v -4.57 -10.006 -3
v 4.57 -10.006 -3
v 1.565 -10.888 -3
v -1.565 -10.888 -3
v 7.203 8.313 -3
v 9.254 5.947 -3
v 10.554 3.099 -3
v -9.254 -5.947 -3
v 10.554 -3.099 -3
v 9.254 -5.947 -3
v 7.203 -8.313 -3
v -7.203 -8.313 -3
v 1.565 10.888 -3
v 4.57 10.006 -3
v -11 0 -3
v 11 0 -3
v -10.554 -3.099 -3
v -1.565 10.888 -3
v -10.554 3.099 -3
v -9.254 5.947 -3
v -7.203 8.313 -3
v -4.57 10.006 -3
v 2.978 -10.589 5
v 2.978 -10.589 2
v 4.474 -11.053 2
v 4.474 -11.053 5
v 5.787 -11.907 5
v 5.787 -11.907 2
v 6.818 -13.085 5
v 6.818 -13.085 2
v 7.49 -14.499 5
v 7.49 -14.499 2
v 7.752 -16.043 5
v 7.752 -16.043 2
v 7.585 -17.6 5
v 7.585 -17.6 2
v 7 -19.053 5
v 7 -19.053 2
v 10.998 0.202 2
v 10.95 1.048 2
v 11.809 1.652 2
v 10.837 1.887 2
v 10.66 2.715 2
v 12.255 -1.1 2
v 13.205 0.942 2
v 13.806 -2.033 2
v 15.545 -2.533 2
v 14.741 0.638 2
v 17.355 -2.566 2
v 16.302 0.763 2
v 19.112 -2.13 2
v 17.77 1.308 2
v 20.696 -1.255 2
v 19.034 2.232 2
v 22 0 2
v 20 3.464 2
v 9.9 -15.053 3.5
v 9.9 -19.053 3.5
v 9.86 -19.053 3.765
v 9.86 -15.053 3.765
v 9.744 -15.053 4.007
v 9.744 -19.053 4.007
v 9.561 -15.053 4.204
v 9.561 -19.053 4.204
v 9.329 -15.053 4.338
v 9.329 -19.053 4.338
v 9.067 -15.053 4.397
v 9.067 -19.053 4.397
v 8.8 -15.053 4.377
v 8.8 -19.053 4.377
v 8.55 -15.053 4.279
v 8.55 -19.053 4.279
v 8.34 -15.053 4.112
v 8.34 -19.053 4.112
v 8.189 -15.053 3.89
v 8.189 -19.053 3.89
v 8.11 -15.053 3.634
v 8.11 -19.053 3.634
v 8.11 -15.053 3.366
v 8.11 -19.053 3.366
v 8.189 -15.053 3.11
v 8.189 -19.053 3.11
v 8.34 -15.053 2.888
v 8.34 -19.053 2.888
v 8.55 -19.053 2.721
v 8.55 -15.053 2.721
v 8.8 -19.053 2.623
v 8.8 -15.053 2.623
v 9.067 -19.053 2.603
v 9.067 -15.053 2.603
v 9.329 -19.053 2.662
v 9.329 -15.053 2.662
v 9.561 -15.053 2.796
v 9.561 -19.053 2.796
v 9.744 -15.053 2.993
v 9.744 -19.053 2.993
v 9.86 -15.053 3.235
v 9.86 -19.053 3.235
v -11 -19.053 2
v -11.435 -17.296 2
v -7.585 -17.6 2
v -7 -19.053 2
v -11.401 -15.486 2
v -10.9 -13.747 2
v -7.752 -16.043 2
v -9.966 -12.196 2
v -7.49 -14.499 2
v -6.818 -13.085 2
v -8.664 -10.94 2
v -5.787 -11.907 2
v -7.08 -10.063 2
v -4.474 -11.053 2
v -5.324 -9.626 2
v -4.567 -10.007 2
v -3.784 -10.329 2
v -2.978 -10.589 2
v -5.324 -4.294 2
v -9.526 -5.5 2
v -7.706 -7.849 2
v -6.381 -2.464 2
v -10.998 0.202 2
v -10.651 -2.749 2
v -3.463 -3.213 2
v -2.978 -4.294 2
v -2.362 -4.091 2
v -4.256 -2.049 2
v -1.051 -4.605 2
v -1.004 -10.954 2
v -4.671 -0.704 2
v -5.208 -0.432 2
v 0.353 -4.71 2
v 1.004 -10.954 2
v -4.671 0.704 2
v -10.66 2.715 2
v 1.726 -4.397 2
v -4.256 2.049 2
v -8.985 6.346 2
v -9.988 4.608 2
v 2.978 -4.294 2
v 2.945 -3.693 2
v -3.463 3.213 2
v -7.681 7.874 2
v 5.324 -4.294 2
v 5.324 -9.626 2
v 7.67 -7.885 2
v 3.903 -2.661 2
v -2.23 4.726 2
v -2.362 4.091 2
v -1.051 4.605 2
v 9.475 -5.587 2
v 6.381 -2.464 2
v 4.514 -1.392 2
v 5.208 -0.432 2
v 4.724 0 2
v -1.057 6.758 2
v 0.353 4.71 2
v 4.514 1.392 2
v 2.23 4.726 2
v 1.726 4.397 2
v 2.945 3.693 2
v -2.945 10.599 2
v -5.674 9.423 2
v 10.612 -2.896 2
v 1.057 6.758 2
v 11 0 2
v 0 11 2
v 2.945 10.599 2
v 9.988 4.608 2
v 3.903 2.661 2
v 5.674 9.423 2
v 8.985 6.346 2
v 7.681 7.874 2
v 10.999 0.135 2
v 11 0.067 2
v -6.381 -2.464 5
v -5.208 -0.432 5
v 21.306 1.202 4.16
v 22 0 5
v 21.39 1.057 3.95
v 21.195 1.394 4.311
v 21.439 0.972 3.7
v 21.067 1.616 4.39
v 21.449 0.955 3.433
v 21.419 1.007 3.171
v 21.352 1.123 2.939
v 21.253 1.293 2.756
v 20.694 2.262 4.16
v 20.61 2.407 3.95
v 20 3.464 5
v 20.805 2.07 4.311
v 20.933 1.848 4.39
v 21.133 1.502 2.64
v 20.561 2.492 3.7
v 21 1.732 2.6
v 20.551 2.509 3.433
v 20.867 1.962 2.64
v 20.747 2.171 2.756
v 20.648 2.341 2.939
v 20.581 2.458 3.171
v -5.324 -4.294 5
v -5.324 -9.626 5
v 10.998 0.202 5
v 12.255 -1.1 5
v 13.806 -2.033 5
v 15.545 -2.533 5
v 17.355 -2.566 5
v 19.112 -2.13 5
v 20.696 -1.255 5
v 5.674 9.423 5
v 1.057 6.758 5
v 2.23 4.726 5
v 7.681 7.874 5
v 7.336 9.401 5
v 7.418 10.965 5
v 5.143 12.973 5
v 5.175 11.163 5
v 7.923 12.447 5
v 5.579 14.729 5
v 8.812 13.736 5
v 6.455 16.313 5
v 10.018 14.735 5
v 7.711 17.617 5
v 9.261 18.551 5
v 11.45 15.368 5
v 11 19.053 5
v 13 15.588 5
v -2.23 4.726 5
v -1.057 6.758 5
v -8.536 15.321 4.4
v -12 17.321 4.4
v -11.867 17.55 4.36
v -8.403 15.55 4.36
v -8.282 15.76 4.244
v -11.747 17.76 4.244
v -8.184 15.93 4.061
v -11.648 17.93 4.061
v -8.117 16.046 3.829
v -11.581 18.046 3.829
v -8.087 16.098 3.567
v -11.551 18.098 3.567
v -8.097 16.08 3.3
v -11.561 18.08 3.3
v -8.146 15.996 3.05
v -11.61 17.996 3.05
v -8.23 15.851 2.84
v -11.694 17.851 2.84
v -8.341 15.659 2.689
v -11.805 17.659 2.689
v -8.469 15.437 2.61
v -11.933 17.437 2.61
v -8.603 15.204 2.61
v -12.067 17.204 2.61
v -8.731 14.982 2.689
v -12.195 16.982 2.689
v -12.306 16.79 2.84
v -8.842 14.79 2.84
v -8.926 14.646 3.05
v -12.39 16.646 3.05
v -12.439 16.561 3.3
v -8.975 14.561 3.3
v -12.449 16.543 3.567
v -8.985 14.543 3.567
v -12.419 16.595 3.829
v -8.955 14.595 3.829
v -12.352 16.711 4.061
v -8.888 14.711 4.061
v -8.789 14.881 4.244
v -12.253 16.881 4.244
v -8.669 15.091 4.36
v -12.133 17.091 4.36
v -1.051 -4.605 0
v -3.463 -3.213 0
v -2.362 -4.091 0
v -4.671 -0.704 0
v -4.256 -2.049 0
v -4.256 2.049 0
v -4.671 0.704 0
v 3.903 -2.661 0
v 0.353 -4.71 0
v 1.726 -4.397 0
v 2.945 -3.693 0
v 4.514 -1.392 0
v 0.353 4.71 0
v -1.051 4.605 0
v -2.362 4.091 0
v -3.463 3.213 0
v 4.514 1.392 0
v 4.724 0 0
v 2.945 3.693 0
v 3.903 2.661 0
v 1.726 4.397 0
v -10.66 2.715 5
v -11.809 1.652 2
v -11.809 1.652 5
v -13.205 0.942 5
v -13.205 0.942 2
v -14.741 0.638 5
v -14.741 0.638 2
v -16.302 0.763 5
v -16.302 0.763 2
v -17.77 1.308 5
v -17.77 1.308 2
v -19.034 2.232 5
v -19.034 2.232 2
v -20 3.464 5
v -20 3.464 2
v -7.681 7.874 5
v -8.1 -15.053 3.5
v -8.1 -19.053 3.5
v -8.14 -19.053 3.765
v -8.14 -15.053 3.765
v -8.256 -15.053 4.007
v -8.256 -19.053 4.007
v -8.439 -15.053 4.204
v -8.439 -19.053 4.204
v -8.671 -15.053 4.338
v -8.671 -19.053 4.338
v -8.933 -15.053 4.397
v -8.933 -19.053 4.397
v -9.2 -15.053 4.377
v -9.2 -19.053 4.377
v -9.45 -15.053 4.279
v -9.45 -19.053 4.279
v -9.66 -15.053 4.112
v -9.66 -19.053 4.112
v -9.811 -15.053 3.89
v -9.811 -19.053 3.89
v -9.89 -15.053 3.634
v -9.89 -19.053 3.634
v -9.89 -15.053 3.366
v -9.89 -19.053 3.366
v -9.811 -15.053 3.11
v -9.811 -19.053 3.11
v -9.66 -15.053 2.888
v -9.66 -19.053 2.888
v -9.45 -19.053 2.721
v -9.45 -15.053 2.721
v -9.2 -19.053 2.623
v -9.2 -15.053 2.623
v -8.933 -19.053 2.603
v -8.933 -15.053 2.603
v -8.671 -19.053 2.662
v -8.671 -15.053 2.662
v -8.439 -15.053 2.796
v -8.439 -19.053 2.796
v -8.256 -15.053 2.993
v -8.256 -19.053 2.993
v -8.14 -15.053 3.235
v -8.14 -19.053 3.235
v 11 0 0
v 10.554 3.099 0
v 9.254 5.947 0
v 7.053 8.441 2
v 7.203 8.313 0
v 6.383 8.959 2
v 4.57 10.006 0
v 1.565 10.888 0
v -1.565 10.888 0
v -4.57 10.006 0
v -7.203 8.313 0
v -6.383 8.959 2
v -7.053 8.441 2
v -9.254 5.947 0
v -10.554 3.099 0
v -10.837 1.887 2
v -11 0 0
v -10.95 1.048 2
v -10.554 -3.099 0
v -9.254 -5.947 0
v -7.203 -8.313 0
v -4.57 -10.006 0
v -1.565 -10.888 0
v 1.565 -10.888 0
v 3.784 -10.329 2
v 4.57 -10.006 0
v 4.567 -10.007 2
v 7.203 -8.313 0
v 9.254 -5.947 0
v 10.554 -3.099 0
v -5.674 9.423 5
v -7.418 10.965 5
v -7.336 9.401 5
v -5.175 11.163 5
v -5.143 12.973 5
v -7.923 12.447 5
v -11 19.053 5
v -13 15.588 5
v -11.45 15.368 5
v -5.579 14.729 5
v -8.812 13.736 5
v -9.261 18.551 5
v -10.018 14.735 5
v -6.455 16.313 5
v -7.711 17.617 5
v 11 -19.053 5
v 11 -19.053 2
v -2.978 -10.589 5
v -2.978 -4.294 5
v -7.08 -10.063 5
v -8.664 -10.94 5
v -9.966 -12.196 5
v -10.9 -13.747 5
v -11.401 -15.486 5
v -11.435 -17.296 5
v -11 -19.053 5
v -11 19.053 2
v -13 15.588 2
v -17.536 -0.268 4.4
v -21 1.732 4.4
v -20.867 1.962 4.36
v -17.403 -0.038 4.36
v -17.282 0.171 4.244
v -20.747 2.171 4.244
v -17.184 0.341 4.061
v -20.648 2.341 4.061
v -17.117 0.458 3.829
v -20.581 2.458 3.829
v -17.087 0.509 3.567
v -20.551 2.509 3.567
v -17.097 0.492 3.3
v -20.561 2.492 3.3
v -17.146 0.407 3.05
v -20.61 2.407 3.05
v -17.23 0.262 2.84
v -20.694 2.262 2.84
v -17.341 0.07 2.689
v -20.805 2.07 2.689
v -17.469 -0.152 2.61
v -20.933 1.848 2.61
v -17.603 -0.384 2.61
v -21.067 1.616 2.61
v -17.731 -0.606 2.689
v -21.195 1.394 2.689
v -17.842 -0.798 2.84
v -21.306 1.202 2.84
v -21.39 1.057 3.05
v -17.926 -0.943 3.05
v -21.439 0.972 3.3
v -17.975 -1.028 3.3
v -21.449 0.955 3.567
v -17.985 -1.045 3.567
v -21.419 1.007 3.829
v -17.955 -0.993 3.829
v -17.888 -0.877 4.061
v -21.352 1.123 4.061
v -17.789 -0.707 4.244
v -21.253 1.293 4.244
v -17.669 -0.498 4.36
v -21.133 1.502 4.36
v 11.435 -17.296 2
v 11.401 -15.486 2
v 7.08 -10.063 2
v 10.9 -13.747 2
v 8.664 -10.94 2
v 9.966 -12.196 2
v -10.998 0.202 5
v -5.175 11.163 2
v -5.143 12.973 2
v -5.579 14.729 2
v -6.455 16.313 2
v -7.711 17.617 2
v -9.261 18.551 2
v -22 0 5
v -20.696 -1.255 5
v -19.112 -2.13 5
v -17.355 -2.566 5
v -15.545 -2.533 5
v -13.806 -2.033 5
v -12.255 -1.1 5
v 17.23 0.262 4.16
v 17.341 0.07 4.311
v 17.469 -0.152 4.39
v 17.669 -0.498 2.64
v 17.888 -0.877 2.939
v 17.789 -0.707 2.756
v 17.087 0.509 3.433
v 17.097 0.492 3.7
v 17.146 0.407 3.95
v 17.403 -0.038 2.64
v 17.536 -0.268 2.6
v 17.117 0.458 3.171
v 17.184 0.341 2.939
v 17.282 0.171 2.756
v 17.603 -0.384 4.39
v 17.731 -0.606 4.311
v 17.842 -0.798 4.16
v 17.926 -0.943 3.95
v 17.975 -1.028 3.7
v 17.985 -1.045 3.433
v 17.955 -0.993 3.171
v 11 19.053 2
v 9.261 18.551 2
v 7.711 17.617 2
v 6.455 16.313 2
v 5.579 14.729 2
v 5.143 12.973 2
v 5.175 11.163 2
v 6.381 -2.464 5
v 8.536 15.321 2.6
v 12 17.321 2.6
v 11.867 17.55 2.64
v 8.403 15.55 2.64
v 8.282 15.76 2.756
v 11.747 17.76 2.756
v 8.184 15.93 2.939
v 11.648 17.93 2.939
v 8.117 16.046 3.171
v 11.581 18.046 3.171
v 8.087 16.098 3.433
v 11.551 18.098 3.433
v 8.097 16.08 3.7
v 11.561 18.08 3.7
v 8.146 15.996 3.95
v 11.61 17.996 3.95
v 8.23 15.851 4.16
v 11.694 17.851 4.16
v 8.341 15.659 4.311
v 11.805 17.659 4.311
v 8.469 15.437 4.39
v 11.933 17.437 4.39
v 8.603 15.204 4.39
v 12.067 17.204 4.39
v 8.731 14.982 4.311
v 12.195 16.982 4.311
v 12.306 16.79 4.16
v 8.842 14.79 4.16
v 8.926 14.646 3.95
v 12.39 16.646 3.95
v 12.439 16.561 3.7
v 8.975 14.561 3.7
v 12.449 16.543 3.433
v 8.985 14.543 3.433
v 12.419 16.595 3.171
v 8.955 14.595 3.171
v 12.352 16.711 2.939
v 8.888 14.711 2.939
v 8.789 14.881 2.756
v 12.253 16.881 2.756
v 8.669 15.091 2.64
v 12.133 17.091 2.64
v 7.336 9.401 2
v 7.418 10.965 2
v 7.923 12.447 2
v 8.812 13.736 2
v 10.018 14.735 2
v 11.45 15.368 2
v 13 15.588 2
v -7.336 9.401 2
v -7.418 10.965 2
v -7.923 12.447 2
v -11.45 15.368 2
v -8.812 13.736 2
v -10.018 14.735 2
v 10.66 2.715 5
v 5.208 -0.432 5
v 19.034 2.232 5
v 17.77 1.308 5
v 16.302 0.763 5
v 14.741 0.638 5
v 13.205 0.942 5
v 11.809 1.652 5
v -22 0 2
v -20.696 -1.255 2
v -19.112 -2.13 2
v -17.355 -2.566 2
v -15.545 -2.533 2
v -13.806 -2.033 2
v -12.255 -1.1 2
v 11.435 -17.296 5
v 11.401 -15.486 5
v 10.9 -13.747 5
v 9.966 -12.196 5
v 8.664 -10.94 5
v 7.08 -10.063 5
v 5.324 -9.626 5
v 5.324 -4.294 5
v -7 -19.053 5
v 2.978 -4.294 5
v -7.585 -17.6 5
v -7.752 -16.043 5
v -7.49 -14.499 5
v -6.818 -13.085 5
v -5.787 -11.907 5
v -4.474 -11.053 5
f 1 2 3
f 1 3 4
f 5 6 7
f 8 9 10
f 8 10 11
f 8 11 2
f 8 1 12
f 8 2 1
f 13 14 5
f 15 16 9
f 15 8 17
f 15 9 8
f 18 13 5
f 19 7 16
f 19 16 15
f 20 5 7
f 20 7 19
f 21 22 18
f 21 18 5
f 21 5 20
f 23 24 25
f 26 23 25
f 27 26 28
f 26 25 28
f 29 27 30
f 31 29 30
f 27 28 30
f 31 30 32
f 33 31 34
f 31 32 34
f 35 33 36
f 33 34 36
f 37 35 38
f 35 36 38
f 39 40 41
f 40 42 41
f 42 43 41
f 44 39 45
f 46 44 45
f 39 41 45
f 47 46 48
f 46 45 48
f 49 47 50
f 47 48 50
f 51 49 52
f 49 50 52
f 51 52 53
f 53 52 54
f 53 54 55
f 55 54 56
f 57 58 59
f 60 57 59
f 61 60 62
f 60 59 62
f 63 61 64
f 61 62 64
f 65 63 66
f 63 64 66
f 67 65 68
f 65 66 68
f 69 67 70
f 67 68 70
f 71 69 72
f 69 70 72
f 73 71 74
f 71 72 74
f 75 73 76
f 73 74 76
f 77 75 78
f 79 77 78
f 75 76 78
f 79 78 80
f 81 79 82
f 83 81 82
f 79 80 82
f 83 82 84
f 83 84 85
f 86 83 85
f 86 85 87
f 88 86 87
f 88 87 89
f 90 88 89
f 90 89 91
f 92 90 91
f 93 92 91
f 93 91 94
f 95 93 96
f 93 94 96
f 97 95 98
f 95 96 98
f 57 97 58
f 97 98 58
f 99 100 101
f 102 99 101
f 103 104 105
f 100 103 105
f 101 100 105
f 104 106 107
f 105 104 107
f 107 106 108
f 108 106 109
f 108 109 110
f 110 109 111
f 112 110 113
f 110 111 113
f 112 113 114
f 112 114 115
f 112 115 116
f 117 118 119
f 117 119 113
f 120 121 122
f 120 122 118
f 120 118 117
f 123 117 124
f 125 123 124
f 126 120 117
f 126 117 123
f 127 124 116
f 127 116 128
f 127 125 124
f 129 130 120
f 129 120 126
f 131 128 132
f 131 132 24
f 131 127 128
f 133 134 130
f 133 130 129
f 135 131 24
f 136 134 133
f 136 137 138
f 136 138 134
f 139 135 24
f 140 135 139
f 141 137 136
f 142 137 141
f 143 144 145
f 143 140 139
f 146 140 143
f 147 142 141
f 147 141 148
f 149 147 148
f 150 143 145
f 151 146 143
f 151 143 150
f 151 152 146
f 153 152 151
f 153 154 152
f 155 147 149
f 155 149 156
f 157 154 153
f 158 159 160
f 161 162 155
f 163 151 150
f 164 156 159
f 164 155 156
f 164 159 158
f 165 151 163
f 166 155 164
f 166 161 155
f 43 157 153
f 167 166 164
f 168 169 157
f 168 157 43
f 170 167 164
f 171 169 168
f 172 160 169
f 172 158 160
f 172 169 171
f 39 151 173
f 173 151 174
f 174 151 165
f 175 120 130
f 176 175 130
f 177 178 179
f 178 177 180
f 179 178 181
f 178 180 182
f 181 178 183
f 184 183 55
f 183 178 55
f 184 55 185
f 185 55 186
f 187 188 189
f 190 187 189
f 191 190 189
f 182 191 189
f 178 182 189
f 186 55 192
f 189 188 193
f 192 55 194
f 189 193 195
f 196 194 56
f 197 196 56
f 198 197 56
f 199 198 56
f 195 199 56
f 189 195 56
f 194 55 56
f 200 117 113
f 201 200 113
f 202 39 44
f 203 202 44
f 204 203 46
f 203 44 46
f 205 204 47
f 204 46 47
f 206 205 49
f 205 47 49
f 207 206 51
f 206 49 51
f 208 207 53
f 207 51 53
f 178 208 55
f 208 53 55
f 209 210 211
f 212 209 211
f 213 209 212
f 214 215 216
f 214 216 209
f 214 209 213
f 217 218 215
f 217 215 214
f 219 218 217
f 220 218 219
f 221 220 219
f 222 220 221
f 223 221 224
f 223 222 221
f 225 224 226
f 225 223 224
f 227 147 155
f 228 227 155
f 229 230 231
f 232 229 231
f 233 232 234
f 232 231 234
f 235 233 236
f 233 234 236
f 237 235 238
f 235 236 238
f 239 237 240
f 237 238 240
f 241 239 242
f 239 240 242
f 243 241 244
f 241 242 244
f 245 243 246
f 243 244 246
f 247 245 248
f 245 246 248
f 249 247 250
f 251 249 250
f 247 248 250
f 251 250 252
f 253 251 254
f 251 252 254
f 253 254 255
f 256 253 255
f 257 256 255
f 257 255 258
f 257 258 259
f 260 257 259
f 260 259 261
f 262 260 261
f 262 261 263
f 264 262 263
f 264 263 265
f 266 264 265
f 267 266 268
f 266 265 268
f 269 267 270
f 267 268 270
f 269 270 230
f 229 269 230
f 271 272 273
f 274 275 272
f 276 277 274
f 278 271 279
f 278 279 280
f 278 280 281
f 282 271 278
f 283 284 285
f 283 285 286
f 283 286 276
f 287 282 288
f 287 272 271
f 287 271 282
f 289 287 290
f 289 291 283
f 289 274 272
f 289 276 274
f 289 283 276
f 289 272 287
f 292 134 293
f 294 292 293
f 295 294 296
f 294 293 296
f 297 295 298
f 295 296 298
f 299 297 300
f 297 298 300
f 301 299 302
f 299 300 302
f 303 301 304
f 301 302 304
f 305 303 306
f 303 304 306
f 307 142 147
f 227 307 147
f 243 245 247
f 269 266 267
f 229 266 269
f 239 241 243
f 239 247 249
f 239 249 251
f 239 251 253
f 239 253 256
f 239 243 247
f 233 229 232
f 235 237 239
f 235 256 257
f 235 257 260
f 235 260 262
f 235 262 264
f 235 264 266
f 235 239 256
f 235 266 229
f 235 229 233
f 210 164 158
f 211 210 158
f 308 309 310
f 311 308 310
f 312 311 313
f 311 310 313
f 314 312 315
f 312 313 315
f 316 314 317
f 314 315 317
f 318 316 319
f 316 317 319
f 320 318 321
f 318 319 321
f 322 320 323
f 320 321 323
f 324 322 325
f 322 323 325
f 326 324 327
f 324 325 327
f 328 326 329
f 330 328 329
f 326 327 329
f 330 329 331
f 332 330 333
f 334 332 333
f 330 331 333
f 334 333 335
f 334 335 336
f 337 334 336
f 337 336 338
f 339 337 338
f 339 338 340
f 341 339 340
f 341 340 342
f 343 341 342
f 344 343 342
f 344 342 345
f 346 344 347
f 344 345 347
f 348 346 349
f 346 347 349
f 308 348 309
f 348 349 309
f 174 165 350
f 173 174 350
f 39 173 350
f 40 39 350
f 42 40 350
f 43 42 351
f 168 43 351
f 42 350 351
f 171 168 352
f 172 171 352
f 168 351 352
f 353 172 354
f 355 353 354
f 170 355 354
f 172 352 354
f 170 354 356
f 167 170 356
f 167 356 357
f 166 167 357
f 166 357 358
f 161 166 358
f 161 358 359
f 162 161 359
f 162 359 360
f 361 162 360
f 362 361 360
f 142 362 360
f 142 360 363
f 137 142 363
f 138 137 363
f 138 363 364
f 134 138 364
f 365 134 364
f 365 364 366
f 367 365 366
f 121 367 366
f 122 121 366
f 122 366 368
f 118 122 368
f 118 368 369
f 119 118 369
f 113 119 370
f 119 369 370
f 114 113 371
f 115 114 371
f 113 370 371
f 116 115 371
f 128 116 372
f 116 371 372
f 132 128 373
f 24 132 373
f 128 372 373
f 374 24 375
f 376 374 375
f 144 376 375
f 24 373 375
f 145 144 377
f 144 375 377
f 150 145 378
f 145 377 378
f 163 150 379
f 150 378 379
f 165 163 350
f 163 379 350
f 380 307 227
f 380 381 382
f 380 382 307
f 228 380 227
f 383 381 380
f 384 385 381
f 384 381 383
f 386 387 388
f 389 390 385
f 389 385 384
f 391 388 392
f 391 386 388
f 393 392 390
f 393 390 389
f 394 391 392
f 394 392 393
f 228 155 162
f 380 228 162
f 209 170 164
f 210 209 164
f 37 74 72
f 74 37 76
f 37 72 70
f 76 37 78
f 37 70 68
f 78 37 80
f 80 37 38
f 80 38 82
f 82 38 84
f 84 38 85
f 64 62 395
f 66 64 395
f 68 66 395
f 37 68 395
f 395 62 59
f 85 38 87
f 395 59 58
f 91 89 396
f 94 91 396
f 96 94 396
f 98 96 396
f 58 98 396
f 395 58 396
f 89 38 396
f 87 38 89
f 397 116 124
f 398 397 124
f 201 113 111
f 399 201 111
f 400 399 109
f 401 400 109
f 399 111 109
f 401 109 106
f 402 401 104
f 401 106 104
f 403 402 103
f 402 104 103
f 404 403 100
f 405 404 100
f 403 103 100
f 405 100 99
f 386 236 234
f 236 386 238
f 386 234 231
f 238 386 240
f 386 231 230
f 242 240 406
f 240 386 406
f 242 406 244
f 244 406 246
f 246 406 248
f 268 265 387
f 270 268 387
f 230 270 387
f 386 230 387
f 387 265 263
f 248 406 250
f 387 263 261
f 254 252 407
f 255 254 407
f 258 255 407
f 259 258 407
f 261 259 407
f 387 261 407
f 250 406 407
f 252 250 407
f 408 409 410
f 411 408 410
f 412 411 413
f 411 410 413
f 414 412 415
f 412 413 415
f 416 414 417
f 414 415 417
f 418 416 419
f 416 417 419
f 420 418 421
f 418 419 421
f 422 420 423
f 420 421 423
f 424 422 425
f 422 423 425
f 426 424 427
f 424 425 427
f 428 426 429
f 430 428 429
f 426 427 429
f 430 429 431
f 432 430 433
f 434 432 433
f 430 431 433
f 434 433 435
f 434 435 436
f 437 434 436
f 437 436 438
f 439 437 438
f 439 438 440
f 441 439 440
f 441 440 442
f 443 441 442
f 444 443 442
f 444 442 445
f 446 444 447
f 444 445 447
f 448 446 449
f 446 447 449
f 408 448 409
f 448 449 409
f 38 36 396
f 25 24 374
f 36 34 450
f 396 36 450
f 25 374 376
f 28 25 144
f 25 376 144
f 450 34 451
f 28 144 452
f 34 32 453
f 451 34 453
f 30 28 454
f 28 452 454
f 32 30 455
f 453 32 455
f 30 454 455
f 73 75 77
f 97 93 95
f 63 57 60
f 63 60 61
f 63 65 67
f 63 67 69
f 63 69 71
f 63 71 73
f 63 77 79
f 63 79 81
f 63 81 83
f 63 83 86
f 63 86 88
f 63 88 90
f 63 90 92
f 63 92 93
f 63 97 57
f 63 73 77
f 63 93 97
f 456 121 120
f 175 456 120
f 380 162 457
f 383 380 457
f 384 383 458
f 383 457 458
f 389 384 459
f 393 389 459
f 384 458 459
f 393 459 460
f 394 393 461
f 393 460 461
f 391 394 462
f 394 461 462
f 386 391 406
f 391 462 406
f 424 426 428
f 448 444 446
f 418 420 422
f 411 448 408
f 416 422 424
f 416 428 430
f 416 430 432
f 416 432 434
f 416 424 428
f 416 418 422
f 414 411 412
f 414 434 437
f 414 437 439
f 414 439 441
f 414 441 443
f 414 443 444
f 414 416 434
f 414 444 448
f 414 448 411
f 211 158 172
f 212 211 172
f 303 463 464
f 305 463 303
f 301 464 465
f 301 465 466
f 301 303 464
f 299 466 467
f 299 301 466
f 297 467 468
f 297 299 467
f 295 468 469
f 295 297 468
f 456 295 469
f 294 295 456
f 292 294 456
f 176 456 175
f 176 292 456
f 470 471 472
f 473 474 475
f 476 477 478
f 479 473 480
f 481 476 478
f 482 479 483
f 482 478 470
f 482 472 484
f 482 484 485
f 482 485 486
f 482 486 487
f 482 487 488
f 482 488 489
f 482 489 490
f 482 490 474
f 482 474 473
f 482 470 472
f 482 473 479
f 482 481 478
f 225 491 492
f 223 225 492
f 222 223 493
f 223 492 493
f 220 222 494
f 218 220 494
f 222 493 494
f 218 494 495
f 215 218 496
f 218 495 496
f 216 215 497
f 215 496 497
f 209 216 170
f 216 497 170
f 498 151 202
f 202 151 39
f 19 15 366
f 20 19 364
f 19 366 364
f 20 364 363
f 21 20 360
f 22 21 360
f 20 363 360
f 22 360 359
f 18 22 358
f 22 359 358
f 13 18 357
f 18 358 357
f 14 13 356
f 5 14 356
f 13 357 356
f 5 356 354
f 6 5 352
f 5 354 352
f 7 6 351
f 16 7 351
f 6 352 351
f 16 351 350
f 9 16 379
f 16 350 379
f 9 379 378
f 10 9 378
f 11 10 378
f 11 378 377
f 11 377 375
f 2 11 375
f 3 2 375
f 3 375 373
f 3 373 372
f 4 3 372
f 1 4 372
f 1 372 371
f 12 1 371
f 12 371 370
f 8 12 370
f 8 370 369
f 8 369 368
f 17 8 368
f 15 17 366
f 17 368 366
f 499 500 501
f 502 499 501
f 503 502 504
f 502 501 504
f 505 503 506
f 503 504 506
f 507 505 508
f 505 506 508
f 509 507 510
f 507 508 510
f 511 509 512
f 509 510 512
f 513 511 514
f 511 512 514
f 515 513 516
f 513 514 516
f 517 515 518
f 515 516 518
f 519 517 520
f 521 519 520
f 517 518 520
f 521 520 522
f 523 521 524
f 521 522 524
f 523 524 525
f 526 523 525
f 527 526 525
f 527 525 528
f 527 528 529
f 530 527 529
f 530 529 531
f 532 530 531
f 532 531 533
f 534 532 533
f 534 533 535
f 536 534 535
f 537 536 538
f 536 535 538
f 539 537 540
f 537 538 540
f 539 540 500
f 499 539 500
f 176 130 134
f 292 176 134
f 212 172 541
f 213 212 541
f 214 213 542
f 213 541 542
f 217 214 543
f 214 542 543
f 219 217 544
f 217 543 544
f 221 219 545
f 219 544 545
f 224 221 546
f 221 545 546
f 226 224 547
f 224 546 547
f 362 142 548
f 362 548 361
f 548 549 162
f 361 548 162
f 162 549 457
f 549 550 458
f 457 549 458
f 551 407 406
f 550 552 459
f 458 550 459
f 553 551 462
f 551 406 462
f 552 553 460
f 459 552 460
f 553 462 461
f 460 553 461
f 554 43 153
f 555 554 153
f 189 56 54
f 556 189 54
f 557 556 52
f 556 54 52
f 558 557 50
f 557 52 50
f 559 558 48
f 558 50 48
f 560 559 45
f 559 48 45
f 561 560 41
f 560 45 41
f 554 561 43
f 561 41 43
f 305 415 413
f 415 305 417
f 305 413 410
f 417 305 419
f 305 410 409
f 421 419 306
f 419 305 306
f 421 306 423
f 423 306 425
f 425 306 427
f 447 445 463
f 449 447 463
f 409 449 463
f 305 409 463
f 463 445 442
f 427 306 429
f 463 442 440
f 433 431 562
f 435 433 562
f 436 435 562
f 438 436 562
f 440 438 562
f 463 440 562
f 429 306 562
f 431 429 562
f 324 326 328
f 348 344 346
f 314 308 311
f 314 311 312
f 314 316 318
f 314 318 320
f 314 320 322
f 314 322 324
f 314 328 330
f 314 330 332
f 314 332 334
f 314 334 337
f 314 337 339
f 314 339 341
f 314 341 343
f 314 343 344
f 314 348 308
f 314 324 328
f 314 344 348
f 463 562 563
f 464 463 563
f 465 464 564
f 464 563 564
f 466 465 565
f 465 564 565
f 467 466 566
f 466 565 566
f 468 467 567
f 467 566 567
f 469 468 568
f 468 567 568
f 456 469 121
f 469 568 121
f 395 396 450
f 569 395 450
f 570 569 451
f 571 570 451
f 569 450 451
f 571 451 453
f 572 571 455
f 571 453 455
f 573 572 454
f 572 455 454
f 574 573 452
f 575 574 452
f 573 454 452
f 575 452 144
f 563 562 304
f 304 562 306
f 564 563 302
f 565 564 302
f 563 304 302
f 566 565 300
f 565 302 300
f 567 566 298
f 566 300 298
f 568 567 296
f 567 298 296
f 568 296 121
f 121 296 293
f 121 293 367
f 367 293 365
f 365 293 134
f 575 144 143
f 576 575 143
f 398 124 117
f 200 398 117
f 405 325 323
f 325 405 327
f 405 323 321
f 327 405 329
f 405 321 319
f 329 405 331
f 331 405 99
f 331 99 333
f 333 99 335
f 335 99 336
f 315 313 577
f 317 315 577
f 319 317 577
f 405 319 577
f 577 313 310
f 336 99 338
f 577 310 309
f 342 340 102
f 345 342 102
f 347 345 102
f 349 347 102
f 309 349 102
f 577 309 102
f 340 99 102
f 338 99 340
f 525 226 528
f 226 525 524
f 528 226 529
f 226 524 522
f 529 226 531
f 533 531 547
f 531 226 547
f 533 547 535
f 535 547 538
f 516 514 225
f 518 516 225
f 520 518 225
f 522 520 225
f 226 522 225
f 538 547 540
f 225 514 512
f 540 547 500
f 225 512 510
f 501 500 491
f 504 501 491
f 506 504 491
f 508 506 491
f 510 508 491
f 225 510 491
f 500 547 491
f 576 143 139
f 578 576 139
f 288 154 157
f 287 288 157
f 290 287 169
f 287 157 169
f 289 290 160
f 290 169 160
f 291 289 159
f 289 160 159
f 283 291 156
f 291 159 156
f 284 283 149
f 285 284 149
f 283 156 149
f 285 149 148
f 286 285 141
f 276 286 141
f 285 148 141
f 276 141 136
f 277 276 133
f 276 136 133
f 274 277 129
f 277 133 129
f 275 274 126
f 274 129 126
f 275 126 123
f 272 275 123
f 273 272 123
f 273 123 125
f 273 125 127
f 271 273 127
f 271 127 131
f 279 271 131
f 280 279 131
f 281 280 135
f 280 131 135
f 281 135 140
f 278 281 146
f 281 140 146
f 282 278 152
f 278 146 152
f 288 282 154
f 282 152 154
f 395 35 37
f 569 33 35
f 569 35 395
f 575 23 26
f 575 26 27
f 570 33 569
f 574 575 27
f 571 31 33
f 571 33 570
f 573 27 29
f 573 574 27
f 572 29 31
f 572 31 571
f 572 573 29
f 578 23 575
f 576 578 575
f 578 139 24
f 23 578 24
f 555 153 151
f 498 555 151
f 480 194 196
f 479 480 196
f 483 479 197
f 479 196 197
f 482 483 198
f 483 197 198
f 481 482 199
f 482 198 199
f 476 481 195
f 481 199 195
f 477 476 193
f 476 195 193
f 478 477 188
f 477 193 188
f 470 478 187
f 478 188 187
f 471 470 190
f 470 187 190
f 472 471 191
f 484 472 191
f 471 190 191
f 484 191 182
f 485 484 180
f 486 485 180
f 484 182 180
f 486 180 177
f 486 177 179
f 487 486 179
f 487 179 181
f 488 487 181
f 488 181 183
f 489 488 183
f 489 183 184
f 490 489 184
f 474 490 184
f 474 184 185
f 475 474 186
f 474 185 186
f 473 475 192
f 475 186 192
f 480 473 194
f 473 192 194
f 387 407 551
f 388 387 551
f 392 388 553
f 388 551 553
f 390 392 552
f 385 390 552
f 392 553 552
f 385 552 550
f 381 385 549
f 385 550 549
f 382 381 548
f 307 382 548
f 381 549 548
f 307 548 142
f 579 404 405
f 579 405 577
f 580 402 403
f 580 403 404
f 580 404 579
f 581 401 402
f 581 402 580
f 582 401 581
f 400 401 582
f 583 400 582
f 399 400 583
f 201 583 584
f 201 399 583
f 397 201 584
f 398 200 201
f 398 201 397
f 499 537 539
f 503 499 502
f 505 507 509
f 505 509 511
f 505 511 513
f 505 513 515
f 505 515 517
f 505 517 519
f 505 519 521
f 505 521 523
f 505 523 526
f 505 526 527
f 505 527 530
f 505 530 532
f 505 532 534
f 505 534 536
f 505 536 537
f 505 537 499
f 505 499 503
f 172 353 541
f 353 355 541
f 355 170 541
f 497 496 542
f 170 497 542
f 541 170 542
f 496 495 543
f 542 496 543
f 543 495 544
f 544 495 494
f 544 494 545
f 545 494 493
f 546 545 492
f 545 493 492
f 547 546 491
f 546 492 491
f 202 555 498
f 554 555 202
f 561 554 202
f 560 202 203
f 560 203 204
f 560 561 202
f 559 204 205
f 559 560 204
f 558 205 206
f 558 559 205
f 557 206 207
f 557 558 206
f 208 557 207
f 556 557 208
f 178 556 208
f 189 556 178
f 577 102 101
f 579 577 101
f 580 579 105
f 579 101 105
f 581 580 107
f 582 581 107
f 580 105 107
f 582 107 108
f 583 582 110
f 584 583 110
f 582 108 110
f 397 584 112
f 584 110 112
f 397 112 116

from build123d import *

# Parameters (mm, degrees)
SKETCH_1_R          = 11
EXTRUDE_1_DEPTH     = 2
EXTRUDE_2_DEPTH     = 3
SKETCH_4_R          = 0.9
CUT_EXTRUDE_1_DEPTH = 4
SKETCH_5_R          = 0.9
CUT_EXTRUDE_2_DEPTH = 4
SKETCH_6_R          = 0.9
CUT_EXTRUDE_3_DEPTH = 4
SKETCH_8_R          = 11
EXTRUDE_3_DEPTH     = 3
SKETCH_9_R          = 4.723532035
CUT_EXTRUDE_4_DEPTH = 2


with BuildPart() as part:
    # 草图1 → 凸台-拉伸1 (new body)
    with BuildSketch(Plane.XY):
        Circle(SKETCH_1_R)
    extrude(amount=EXTRUDE_1_DEPTH)

    # 草图2 → 凸台-拉伸2 (add)
    with BuildSketch(Plane.XY.offset(2)):
        with BuildLine():
            ThreePointArc((-5.674338907, 9.423474835), (-6.722663515, 8.706652357), (-7.681381188, 7.873778194))
            Line((-7.681381188, 7.873778194), (-2.2295398, 4.726156102))
            Line((-2.2295398, 4.726156102), (-1.056740901, 6.757503383))
            Line((-1.056740901, 6.757503383), (-5.674338907, 9.423474835))
        make_face()
        with BuildLine():
            Line((-11, 19.052558883), (-13, 15.588457268))
            ThreePointArc((-13, 15.588457268), (-8.322973179, 13.122163256), (-7.681381188, 7.873778194))
            ThreePointArc((-7.681381188, 7.873778194), (-6.722663515, 8.706652357), (-5.674338907, 9.423474835))
            ThreePointArc((-5.674338907, 9.423474835), (-5.965261919, 15.549873274), (-11, 19.052558883))
        make_face()
        with BuildLine():
            Line((-20, 3.464101615), (-22, 0))
            ThreePointArc((-22, 0), (-16.44921624, -2.608868275), (-10.998138053, 0.202384226))
            ThreePointArc((-10.998138053, 0.202384226), (-10.901513881, 1.468671206), (-10.659582534, 2.715382148))
            ThreePointArc((-10.659582534, 2.715382148), (-15.525613322, 0.64682458), (-20, 3.464101615))
        make_face()
        with BuildLine():
            ThreePointArc((-10.659582534, 2.715382148), (-10.901513881, 1.468671206), (-10.998138053, 0.202384226))
            Line((-10.998138053, 0.202384226), (-6.380540046, -2.463587226))
            Line((-6.380540046, -2.463587226), (-5.207741146, -0.432239945))
            Line((-5.207741146, -0.432239945), (-10.659582534, 2.715382148))
        make_face()
        with BuildLine():
            ThreePointArc((-5.323799145, -9.625859061), (-10.483954321, -12.941004999), (-11, -19.052558883))
            Line((-11, -19.052558883), (-7, -19.052558883))
            ThreePointArc((-7, -19.052558883), (-7.202640143, -13.768987836), (-2.978201346, -10.589160342))
            ThreePointArc((-2.978201346, -10.589160342), (-4.178850366, -10.175323563), (-5.323799145, -9.625859061))
        make_face()
        with BuildLine():
            Line((-5.323799145, -4.293916157), (-5.323799145, -9.625859061))
            ThreePointArc((-5.323799145, -9.625859061), (-4.178850366, -10.175323563), (-2.978201346, -10.589160342))
            Line((-2.978201346, -10.589160342), (-2.978201346, -4.293916157))
            Line((-2.978201346, -4.293916157), (-5.323799145, -4.293916157))
        make_face()
        with BuildLine():
            Line((2.978201346, -4.293916157), (2.978201346, -10.589160342))
            ThreePointArc((2.978201346, -10.589160342), (4.178850366, -10.175323563), (5.323799145, -9.625859061))
            Line((5.323799145, -9.625859061), (5.323799145, -4.293916157))
            Line((5.323799145, -4.293916157), (2.978201346, -4.293916157))
        make_face()
        with BuildLine():
            ThreePointArc((2.978201346, -10.589160342), (7.202640143, -13.768987836), (7, -19.052558883))
            Line((7, -19.052558883), (11, -19.052558883))
            ThreePointArc((11, -19.052558883), (10.483954321, -12.941004999), (5.323799145, -9.625859061))
            ThreePointArc((5.323799145, -9.625859061), (4.178850366, -10.175323563), (2.978201346, -10.589160342))
        make_face()
        with BuildLine():
            ThreePointArc((10.998138053, 0.202384226), (16.44921624, -2.608868275), (22, 0))
            Line((22, 0), (20, 3.464101615))
            ThreePointArc((20, 3.464101615), (15.525613322, 0.64682458), (10.659582534, 2.715382148))
            ThreePointArc((10.659582534, 2.715382148), (10.901513881, 1.468671206), (10.998138053, 0.202384226))
        make_face()
        with BuildLine():
            Line((6.380540046, -2.463587226), (10.998138053, 0.202384226))
            ThreePointArc((10.998138053, 0.202384226), (10.901513881, 1.468671206), (10.659582534, 2.715382148))
            Line((10.659582534, 2.715382148), (5.207741146, -0.432239945))
            Line((5.207741146, -0.432239945), (6.380540046, -2.463587226))
        make_face()
        with BuildLine():
            ThreePointArc((7.681381188, 7.873778194), (6.722663515, 8.706652357), (5.674338907, 9.423474835))
            Line((5.674338907, 9.423474835), (1.056740901, 6.757503383))
            Line((1.056740901, 6.757503383), (2.2295398, 4.726156102))
            Line((2.2295398, 4.726156102), (7.681381188, 7.873778194))
        make_face()
        with BuildLine():
            Line((13, 15.588457268), (11, 19.052558883))
            ThreePointArc((11, 19.052558883), (5.965261919, 15.549873274), (5.674338907, 9.423474835))
            ThreePointArc((5.674338907, 9.423474835), (6.722663515, 8.706652357), (7.681381188, 7.873778194))
            ThreePointArc((7.681381188, 7.873778194), (8.322973179, 13.122163256), (13, 15.588457268))
        make_face()
    extrude(amount=EXTRUDE_2_DEPTH)

    # 草图4 → 切除-拉伸1 (cut)
    with BuildSketch(Plane(origin=(-16.5, 9.526279442, 0), x_dir=(0, 0, 1), z_dir=(-0.866025404, 0.5, 0))):
        with Locations((3.5, 9)):
            Circle(SKETCH_4_R)
        with Locations((3.5, -9)):
            Circle(SKETCH_4_R)
    extrude(amount=-CUT_EXTRUDE_1_DEPTH, mode=Mode.SUBTRACT)

    # 草图5 → 切除-拉伸2 (cut)
    with BuildSketch(Plane(origin=(16.5, 9.526279442, 0), x_dir=(0, 0, -1), z_dir=(0.866025404, 0.5, 0))):
        with Locations((-3.5, -9)):
            Circle(SKETCH_5_R)
        with Locations((-3.5, 9)):
            Circle(SKETCH_5_R)
    extrude(amount=-CUT_EXTRUDE_2_DEPTH, mode=Mode.SUBTRACT)

    # 草图6 → 切除-拉伸3 (cut)
    with BuildSketch(Plane.XZ.offset(19.052558883)):
        with Locations((-9, 3.5)):
            Circle(SKETCH_6_R)
        with Locations((9, 3.5)):
            Circle(SKETCH_6_R)
    extrude(amount=-CUT_EXTRUDE_3_DEPTH, mode=Mode.SUBTRACT)

    # 草图8 → 凸台-拉伸3 (add)
    with BuildSketch(Plane(origin=(0, 0, 0), x_dir=(-1, 0, 0), z_dir=(0, 0, -1))):
        Circle(SKETCH_8_R)
    extrude(amount=EXTRUDE_3_DEPTH)

    # 草图9 → 切除-拉伸4 (cut)
    with BuildSketch(Plane.XY.offset(2)):
        Circle(SKETCH_9_R)
    extrude(amount=-CUT_EXTRUDE_4_DEPTH, mode=Mode.SUBTRACT)


solid = part.part
